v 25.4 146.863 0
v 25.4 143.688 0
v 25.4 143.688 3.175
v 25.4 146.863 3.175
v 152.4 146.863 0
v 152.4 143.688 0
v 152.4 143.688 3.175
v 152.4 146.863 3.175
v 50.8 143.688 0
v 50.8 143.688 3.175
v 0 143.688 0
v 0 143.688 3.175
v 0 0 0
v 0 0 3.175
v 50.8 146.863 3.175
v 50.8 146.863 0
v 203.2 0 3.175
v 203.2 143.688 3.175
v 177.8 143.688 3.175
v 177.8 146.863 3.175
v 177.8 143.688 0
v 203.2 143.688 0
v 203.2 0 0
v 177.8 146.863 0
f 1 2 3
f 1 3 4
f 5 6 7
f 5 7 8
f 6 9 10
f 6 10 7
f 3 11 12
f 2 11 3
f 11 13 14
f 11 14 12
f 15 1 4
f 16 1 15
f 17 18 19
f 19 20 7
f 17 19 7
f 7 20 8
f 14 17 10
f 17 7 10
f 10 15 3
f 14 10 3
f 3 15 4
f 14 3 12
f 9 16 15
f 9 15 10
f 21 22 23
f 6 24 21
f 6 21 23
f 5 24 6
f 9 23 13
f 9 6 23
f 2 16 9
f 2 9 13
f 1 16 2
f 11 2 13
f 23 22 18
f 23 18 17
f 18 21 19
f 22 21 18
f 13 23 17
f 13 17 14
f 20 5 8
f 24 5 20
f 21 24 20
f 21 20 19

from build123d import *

# Parameters (mm, degrees)
BOSS_EXTRUDE1_DEPTH = 3.175
BOSS_EXTRUDE2_DEPTH = 3.175


with BuildPart() as part:
    # Sketch1 → Boss-Extrude1 (new body)
    with BuildSketch(Plane.XY):
        Polygon((0, 143.6878), (25.4, 143.6878), (25.4, 146.8628), (50.8, 146.8628), (50.8, 143.6878), (152.4, 143.6878), (152.4, 146.8628), (177.8, 146.8628), (177.8, 143.6878), (203.2, 143.6878), (203.2, 0), (0, 0), align=None)
    extrude(amount=BOSS_EXTRUDE1_DEPTH)

    # Sketch1<2> → Boss-Extrude2 (add)
    with BuildSketch(Plane.XY):
        Polygon((0, 143.6878), (25.4, 143.6878), (25.4, 146.8628), (50.8, 146.8628), (50.8, 143.6878), (152.4, 143.6878), (152.4, 146.8628), (177.8, 146.8628), (177.8, 143.6878), (203.2, 143.6878), (203.2, 0), (0, 0), align=None)
    extrude(amount=BOSS_EXTRUDE2_DEPTH)


solid = part.part
